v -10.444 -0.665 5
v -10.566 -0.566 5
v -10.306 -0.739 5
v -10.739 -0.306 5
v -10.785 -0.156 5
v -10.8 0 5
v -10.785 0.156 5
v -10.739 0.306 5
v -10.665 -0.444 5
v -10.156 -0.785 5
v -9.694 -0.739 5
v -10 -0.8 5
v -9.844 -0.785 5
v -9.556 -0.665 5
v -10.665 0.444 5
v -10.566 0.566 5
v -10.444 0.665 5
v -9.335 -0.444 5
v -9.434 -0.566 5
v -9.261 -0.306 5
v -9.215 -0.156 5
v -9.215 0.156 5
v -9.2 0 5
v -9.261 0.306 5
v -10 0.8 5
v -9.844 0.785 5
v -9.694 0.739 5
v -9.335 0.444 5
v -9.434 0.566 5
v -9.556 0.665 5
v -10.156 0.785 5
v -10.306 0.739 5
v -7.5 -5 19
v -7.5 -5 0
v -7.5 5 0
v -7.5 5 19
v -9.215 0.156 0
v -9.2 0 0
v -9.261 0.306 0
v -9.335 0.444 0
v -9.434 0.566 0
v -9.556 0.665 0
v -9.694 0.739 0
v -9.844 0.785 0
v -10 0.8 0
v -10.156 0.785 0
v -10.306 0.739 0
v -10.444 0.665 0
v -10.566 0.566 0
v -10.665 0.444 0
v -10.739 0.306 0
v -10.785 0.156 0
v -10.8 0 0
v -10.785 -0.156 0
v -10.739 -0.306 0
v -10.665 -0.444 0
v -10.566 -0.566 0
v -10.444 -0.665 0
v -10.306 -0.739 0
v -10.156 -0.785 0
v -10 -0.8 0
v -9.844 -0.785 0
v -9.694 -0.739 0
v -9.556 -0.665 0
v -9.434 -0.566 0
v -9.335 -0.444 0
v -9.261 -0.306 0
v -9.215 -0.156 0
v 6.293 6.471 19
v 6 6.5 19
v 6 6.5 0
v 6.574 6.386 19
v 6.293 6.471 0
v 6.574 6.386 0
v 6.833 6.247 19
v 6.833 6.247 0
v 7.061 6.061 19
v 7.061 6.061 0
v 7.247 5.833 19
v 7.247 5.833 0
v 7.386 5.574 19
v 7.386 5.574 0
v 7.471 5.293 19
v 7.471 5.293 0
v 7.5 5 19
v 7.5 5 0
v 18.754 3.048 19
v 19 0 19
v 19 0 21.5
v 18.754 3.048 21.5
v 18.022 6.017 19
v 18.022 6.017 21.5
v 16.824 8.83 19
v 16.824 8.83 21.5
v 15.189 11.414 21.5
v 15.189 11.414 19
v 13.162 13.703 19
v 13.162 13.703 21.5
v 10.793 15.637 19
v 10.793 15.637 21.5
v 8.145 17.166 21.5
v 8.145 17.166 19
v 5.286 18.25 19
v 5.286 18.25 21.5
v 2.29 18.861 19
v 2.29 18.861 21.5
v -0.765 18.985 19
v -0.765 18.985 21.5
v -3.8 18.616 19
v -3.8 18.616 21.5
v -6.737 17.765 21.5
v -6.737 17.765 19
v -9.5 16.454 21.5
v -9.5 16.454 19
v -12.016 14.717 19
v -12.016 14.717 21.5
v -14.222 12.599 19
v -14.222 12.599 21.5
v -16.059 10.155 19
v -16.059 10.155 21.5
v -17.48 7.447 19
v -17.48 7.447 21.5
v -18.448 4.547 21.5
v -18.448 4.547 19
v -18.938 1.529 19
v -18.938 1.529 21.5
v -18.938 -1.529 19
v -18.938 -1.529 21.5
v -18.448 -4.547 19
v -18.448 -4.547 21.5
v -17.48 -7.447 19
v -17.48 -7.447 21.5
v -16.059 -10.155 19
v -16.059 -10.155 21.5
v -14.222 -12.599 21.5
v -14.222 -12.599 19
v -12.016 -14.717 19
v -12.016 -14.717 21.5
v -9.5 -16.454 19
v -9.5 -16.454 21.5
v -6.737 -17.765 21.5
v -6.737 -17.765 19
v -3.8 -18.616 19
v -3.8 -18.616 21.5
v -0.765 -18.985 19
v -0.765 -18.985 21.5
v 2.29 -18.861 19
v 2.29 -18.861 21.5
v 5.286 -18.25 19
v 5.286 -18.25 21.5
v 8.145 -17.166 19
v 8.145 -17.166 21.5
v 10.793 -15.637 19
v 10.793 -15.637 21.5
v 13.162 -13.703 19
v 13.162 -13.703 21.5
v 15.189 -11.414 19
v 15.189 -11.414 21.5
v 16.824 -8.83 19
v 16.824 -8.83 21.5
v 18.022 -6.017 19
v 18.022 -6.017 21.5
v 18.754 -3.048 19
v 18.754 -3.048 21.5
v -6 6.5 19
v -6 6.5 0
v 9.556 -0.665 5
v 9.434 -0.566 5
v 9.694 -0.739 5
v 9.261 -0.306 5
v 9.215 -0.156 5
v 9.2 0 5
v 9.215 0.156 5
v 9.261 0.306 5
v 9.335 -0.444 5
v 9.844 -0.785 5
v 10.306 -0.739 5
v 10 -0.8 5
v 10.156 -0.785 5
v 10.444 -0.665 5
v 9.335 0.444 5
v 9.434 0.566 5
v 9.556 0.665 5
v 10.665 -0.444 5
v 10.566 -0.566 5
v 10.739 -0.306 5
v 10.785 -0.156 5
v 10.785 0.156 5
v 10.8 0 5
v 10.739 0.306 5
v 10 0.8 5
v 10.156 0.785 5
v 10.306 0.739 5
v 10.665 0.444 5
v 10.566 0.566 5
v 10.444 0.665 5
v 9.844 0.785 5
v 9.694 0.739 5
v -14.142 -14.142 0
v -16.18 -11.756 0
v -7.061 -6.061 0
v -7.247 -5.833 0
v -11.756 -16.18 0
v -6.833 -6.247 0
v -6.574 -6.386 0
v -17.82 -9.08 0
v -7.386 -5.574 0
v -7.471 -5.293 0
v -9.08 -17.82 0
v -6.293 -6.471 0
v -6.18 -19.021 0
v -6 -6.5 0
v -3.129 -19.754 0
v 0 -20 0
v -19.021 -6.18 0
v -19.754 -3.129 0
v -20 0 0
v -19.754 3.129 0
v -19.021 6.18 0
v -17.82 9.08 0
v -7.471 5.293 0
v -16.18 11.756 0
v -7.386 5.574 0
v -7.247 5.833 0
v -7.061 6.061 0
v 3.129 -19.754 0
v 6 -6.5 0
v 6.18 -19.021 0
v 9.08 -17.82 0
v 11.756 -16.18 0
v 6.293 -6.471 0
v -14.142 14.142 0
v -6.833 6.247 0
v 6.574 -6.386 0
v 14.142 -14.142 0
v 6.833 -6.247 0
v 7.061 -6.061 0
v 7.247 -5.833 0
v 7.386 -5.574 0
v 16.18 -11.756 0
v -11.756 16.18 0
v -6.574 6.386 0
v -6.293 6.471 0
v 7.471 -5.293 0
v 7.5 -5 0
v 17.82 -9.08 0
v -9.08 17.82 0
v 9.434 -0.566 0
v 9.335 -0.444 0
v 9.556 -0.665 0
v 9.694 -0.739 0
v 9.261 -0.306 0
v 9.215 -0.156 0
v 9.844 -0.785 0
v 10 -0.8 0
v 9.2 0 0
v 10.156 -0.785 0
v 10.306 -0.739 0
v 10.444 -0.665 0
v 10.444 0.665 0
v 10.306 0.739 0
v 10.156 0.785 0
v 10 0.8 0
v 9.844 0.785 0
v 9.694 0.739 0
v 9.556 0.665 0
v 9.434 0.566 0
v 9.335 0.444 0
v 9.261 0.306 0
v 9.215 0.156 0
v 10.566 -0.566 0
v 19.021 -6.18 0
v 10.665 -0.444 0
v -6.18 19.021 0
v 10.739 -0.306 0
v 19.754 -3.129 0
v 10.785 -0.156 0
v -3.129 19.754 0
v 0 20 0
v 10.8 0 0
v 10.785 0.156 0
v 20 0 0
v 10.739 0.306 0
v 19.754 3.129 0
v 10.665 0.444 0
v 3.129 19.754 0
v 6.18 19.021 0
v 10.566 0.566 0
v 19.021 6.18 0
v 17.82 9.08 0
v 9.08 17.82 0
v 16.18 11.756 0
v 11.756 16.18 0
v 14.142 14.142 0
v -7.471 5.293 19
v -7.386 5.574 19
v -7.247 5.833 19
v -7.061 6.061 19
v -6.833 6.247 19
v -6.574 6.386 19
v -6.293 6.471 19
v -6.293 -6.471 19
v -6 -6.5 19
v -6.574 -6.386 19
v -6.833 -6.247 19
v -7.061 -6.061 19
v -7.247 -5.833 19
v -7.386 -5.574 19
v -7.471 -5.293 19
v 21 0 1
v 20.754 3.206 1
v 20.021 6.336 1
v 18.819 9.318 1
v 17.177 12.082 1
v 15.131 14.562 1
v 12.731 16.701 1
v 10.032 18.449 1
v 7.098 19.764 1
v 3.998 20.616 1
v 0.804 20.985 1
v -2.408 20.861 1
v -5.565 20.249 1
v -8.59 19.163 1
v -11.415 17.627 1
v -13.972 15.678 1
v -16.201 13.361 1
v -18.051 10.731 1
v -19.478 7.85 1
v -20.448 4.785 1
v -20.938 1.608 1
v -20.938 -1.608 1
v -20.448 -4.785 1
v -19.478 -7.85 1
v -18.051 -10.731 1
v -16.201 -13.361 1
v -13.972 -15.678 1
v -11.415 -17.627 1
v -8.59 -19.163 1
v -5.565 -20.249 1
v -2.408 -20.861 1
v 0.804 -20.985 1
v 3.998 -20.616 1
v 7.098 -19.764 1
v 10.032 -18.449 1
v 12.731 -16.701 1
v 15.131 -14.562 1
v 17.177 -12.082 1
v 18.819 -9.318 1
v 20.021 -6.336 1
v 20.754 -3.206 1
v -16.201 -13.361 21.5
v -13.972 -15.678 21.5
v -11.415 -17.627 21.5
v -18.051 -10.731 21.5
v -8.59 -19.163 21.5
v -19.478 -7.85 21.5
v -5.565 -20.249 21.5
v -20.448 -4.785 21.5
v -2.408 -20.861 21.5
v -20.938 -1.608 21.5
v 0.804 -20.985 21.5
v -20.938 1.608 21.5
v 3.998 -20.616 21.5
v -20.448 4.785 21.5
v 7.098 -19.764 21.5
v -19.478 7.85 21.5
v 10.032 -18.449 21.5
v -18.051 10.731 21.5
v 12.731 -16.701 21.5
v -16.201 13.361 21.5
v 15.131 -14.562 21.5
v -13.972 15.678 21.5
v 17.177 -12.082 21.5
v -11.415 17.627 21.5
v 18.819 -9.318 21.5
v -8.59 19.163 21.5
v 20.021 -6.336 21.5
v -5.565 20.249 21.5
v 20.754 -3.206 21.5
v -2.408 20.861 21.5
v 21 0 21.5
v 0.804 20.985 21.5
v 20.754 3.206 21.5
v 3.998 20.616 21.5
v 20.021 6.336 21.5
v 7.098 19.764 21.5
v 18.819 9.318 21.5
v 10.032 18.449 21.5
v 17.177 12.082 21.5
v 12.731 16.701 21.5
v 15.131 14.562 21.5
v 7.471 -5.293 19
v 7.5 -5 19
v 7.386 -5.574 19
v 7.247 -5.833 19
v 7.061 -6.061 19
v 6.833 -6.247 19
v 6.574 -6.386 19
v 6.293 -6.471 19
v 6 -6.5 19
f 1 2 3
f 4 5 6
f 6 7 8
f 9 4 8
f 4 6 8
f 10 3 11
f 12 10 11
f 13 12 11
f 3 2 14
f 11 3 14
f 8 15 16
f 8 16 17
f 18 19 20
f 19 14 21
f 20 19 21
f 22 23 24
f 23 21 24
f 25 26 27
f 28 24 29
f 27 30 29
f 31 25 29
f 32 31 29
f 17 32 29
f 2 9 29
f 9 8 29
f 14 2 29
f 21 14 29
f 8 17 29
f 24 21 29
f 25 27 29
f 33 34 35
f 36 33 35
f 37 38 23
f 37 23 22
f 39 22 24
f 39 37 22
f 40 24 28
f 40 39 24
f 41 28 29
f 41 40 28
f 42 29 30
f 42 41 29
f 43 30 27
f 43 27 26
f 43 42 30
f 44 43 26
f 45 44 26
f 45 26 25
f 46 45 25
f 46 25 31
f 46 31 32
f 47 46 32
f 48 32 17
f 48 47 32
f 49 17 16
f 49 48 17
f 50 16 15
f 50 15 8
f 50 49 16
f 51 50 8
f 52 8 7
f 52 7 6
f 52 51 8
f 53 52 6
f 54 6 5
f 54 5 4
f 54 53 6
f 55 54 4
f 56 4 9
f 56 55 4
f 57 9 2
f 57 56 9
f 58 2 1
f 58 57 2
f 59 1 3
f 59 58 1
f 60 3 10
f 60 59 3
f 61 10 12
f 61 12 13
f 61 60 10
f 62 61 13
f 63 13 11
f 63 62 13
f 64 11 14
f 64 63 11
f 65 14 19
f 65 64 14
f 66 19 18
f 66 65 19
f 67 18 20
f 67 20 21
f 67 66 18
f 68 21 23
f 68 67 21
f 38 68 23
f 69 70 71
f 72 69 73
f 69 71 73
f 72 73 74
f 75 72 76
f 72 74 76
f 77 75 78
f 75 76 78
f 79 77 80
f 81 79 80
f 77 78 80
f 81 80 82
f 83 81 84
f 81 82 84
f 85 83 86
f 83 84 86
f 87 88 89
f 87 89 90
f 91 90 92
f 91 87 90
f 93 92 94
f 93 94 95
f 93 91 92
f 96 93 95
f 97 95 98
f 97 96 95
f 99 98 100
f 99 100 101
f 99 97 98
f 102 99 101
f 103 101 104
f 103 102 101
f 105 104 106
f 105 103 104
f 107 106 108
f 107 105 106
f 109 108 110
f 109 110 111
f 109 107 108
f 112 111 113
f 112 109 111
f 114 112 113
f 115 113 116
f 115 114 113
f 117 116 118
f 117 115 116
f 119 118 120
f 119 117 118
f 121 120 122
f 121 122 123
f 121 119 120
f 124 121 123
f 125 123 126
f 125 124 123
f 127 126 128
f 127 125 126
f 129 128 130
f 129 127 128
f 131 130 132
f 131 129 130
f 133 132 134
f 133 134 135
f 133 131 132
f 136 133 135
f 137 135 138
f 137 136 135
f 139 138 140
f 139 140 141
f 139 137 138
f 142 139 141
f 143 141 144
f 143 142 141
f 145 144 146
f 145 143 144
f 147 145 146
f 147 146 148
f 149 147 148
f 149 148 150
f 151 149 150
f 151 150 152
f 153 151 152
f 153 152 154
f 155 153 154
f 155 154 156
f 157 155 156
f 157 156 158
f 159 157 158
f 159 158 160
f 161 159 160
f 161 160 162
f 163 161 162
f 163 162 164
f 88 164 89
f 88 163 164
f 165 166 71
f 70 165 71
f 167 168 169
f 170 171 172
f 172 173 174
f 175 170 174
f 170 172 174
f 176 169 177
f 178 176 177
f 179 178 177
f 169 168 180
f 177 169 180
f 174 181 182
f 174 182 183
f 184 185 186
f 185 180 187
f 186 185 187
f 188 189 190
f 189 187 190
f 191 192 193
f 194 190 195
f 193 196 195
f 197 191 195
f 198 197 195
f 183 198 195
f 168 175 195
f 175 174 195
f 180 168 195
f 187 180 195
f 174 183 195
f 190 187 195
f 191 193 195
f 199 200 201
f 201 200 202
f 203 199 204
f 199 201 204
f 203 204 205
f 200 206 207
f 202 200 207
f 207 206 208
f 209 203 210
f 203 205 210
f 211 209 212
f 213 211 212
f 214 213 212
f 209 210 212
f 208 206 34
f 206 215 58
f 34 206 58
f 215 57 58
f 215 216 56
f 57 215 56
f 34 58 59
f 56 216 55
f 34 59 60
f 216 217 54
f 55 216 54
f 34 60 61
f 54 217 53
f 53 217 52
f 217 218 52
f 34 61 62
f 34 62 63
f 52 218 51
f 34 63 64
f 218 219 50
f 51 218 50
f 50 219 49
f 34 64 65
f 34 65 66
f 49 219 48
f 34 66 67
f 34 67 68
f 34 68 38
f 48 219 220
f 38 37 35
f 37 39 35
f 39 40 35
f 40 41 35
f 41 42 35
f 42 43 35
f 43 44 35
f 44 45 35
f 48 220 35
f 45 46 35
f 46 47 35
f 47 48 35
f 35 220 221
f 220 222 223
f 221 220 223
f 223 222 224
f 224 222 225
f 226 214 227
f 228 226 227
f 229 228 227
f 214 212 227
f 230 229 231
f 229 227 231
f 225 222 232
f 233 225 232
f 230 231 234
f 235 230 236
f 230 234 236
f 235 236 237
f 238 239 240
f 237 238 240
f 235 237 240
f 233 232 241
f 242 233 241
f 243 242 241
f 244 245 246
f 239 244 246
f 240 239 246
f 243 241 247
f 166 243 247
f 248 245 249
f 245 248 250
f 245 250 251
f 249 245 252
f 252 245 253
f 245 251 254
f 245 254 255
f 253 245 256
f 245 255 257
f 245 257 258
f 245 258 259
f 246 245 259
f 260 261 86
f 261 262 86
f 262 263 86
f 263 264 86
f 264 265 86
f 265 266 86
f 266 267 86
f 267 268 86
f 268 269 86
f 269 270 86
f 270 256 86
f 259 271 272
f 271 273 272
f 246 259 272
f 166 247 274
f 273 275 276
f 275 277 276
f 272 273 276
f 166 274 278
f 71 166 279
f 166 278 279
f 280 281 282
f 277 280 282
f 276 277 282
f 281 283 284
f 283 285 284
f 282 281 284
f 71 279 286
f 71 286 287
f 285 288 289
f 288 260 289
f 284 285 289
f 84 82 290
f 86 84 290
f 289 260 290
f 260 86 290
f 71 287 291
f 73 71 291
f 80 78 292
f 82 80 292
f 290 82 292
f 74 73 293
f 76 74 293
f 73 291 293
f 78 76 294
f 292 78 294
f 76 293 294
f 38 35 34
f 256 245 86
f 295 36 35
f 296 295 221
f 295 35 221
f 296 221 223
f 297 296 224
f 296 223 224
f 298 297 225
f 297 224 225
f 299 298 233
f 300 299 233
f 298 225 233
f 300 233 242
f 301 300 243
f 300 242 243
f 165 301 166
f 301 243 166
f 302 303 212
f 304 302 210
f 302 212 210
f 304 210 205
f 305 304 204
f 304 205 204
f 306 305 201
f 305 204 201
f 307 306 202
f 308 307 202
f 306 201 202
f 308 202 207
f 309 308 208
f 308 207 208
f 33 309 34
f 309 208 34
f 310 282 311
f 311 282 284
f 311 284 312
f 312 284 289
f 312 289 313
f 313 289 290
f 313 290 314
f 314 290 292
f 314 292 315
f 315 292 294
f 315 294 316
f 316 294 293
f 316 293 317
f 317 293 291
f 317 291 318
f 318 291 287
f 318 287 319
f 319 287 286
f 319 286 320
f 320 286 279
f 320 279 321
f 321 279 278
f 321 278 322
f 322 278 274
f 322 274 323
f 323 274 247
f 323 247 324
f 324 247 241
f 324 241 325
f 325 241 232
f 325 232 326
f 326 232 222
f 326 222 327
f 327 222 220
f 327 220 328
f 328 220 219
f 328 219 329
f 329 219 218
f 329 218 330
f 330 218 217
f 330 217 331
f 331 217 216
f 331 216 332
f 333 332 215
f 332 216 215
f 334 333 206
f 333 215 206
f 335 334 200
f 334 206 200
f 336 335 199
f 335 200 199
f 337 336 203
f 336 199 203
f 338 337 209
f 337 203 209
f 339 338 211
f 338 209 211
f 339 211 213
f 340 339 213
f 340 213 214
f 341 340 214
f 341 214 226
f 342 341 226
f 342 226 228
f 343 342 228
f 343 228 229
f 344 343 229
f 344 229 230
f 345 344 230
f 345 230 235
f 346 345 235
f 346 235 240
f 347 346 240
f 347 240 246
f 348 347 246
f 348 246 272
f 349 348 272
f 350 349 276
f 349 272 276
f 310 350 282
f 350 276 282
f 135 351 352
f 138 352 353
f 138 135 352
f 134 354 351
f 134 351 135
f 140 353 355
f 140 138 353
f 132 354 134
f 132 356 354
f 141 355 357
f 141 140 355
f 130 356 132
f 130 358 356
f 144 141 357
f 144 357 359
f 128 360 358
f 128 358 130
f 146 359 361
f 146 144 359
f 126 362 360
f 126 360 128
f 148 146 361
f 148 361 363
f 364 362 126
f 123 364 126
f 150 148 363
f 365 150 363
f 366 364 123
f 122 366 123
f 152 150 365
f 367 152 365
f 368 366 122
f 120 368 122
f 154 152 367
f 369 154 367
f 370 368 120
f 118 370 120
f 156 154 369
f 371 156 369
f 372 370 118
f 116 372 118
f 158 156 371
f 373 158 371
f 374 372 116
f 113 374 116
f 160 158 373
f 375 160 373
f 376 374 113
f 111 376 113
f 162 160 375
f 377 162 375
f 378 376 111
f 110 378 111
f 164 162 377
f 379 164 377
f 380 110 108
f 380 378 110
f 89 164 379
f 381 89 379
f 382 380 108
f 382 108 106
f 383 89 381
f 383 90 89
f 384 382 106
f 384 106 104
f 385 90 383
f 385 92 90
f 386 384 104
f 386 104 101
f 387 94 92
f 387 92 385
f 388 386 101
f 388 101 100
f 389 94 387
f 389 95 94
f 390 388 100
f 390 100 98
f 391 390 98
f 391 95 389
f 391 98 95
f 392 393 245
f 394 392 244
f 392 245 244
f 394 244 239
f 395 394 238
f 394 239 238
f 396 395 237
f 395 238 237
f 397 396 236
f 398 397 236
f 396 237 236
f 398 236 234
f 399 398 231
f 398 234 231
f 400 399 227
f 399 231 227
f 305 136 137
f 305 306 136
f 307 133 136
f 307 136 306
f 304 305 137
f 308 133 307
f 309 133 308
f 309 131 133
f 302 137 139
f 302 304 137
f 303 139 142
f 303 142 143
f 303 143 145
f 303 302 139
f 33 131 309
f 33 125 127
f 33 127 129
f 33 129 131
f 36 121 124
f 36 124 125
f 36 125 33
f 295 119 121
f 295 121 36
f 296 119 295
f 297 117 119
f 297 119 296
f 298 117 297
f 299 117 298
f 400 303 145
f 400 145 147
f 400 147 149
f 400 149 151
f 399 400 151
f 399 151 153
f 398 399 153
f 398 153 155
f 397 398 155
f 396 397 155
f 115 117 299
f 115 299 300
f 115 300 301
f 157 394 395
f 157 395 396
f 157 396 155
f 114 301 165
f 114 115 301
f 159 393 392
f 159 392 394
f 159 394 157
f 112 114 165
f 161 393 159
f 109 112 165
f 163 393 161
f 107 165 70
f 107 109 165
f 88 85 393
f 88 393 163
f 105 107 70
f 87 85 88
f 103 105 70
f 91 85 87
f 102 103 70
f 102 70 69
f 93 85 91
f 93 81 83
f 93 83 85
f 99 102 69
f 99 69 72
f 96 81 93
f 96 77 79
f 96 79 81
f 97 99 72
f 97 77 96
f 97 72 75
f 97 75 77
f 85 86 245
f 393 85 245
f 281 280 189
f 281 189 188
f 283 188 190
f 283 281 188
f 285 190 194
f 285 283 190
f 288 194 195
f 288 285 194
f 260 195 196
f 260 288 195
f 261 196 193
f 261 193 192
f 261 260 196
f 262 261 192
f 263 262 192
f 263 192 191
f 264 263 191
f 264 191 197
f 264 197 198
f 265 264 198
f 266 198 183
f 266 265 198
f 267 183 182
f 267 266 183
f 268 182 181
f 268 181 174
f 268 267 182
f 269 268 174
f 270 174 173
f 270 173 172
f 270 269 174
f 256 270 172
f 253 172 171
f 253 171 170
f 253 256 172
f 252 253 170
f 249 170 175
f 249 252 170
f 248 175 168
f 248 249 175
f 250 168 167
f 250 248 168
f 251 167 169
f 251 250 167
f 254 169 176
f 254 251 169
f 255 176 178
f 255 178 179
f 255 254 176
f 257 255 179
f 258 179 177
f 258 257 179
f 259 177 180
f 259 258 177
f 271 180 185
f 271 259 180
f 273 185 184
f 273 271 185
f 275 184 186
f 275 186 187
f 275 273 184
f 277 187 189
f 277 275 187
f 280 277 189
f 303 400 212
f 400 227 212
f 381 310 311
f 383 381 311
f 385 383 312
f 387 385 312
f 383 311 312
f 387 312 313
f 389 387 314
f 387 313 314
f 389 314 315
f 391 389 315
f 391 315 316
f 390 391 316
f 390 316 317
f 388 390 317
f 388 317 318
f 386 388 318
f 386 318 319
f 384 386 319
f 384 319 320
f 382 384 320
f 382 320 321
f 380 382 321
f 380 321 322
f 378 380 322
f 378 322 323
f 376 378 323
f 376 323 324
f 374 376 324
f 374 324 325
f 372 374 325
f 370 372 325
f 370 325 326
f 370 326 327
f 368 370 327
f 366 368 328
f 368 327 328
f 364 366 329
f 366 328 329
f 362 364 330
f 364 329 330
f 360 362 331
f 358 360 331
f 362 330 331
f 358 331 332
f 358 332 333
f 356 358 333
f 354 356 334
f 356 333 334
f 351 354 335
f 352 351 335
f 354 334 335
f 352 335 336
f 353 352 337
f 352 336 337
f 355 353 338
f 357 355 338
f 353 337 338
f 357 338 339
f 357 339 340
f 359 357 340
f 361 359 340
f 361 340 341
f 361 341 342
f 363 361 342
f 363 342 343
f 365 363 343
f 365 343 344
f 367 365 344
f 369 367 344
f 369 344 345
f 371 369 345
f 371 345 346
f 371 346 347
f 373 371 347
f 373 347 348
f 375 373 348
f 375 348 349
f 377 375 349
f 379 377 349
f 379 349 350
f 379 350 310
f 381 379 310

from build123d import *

# Parameters (mm, degrees)
F0_R     = 21
F0_R_2   = 0.8
F1_DEPTH = 5
F2_R     = 21
F3_DEPTH = 14
F4_R     = 21
F4_R_2   = 19
F5_DEPTH = 2.5
F6_SIZE  = 1


with BuildPart() as f1:
    # F0 (on Top) → F1 (new body)
    with BuildSketch(Plane.XY):
        Circle(F0_R)
        with Locations((-10, 0)):
            Circle(F0_R_2, mode=Mode.SUBTRACT)
        with BuildLine():
            Line((6, -6.5), (-6, -6.5))
            ThreePointArc((-6, -6.5), (-7.06066, -6.06066), (-7.5, -5))
            Line((-7.5, -5), (-7.5, 5))
            ThreePointArc((-7.5, 5), (-7.06066, 6.06066), (-6, 6.5))
            Line((-6, 6.5), (6, 6.5))
            ThreePointArc((6, 6.5), (7.06066, 6.06066), (7.5, 5))
            Line((7.5, 5), (7.5, -5))
            ThreePointArc((7.5, -5), (7.06066, -6.06066), (6, -6.5))
        make_face(mode=Mode.SUBTRACT)
        with Locations((10, 0)):
            Circle(F0_R_2, mode=Mode.SUBTRACT)
    extrude(amount=F1_DEPTH)

    # F2 (on face) → F3 (join)
    with BuildSketch(Plane.XY.offset(5)):
        Circle(F2_R)
        with BuildLine():
            Line((6, -6.5), (-6, -6.5))
            ThreePointArc((-6, -6.5), (-7.06066, -6.06066), (-7.5, -5))
            Line((-7.5, -5), (-7.5, 5))
            ThreePointArc((-7.5, 5), (-7.06066, 6.06066), (-6, 6.5))
            Line((-6, 6.5), (6, 6.5))
            ThreePointArc((6, 6.5), (7.06066, 6.06066), (7.5, 5))
            Line((7.5, 5), (7.5, -5))
            ThreePointArc((7.5, -5), (7.06066, -6.06066), (6, -6.5))
        make_face(mode=Mode.SUBTRACT)
    extrude(amount=F3_DEPTH)

    # F4 (on face) → F5 (join)
    with BuildSketch(Plane.XY.offset(19)):
        Circle(F4_R)
        Circle(F4_R_2, mode=Mode.SUBTRACT)
    extrude(amount=F5_DEPTH)

    # F6
    f6_edges = [f1.edges().sort_by_distance(p)[0] for p in [
        (-21, 0, 0),
    ]]
    chamfer(f6_edges, length=F6_SIZE)


solid = f1.part
